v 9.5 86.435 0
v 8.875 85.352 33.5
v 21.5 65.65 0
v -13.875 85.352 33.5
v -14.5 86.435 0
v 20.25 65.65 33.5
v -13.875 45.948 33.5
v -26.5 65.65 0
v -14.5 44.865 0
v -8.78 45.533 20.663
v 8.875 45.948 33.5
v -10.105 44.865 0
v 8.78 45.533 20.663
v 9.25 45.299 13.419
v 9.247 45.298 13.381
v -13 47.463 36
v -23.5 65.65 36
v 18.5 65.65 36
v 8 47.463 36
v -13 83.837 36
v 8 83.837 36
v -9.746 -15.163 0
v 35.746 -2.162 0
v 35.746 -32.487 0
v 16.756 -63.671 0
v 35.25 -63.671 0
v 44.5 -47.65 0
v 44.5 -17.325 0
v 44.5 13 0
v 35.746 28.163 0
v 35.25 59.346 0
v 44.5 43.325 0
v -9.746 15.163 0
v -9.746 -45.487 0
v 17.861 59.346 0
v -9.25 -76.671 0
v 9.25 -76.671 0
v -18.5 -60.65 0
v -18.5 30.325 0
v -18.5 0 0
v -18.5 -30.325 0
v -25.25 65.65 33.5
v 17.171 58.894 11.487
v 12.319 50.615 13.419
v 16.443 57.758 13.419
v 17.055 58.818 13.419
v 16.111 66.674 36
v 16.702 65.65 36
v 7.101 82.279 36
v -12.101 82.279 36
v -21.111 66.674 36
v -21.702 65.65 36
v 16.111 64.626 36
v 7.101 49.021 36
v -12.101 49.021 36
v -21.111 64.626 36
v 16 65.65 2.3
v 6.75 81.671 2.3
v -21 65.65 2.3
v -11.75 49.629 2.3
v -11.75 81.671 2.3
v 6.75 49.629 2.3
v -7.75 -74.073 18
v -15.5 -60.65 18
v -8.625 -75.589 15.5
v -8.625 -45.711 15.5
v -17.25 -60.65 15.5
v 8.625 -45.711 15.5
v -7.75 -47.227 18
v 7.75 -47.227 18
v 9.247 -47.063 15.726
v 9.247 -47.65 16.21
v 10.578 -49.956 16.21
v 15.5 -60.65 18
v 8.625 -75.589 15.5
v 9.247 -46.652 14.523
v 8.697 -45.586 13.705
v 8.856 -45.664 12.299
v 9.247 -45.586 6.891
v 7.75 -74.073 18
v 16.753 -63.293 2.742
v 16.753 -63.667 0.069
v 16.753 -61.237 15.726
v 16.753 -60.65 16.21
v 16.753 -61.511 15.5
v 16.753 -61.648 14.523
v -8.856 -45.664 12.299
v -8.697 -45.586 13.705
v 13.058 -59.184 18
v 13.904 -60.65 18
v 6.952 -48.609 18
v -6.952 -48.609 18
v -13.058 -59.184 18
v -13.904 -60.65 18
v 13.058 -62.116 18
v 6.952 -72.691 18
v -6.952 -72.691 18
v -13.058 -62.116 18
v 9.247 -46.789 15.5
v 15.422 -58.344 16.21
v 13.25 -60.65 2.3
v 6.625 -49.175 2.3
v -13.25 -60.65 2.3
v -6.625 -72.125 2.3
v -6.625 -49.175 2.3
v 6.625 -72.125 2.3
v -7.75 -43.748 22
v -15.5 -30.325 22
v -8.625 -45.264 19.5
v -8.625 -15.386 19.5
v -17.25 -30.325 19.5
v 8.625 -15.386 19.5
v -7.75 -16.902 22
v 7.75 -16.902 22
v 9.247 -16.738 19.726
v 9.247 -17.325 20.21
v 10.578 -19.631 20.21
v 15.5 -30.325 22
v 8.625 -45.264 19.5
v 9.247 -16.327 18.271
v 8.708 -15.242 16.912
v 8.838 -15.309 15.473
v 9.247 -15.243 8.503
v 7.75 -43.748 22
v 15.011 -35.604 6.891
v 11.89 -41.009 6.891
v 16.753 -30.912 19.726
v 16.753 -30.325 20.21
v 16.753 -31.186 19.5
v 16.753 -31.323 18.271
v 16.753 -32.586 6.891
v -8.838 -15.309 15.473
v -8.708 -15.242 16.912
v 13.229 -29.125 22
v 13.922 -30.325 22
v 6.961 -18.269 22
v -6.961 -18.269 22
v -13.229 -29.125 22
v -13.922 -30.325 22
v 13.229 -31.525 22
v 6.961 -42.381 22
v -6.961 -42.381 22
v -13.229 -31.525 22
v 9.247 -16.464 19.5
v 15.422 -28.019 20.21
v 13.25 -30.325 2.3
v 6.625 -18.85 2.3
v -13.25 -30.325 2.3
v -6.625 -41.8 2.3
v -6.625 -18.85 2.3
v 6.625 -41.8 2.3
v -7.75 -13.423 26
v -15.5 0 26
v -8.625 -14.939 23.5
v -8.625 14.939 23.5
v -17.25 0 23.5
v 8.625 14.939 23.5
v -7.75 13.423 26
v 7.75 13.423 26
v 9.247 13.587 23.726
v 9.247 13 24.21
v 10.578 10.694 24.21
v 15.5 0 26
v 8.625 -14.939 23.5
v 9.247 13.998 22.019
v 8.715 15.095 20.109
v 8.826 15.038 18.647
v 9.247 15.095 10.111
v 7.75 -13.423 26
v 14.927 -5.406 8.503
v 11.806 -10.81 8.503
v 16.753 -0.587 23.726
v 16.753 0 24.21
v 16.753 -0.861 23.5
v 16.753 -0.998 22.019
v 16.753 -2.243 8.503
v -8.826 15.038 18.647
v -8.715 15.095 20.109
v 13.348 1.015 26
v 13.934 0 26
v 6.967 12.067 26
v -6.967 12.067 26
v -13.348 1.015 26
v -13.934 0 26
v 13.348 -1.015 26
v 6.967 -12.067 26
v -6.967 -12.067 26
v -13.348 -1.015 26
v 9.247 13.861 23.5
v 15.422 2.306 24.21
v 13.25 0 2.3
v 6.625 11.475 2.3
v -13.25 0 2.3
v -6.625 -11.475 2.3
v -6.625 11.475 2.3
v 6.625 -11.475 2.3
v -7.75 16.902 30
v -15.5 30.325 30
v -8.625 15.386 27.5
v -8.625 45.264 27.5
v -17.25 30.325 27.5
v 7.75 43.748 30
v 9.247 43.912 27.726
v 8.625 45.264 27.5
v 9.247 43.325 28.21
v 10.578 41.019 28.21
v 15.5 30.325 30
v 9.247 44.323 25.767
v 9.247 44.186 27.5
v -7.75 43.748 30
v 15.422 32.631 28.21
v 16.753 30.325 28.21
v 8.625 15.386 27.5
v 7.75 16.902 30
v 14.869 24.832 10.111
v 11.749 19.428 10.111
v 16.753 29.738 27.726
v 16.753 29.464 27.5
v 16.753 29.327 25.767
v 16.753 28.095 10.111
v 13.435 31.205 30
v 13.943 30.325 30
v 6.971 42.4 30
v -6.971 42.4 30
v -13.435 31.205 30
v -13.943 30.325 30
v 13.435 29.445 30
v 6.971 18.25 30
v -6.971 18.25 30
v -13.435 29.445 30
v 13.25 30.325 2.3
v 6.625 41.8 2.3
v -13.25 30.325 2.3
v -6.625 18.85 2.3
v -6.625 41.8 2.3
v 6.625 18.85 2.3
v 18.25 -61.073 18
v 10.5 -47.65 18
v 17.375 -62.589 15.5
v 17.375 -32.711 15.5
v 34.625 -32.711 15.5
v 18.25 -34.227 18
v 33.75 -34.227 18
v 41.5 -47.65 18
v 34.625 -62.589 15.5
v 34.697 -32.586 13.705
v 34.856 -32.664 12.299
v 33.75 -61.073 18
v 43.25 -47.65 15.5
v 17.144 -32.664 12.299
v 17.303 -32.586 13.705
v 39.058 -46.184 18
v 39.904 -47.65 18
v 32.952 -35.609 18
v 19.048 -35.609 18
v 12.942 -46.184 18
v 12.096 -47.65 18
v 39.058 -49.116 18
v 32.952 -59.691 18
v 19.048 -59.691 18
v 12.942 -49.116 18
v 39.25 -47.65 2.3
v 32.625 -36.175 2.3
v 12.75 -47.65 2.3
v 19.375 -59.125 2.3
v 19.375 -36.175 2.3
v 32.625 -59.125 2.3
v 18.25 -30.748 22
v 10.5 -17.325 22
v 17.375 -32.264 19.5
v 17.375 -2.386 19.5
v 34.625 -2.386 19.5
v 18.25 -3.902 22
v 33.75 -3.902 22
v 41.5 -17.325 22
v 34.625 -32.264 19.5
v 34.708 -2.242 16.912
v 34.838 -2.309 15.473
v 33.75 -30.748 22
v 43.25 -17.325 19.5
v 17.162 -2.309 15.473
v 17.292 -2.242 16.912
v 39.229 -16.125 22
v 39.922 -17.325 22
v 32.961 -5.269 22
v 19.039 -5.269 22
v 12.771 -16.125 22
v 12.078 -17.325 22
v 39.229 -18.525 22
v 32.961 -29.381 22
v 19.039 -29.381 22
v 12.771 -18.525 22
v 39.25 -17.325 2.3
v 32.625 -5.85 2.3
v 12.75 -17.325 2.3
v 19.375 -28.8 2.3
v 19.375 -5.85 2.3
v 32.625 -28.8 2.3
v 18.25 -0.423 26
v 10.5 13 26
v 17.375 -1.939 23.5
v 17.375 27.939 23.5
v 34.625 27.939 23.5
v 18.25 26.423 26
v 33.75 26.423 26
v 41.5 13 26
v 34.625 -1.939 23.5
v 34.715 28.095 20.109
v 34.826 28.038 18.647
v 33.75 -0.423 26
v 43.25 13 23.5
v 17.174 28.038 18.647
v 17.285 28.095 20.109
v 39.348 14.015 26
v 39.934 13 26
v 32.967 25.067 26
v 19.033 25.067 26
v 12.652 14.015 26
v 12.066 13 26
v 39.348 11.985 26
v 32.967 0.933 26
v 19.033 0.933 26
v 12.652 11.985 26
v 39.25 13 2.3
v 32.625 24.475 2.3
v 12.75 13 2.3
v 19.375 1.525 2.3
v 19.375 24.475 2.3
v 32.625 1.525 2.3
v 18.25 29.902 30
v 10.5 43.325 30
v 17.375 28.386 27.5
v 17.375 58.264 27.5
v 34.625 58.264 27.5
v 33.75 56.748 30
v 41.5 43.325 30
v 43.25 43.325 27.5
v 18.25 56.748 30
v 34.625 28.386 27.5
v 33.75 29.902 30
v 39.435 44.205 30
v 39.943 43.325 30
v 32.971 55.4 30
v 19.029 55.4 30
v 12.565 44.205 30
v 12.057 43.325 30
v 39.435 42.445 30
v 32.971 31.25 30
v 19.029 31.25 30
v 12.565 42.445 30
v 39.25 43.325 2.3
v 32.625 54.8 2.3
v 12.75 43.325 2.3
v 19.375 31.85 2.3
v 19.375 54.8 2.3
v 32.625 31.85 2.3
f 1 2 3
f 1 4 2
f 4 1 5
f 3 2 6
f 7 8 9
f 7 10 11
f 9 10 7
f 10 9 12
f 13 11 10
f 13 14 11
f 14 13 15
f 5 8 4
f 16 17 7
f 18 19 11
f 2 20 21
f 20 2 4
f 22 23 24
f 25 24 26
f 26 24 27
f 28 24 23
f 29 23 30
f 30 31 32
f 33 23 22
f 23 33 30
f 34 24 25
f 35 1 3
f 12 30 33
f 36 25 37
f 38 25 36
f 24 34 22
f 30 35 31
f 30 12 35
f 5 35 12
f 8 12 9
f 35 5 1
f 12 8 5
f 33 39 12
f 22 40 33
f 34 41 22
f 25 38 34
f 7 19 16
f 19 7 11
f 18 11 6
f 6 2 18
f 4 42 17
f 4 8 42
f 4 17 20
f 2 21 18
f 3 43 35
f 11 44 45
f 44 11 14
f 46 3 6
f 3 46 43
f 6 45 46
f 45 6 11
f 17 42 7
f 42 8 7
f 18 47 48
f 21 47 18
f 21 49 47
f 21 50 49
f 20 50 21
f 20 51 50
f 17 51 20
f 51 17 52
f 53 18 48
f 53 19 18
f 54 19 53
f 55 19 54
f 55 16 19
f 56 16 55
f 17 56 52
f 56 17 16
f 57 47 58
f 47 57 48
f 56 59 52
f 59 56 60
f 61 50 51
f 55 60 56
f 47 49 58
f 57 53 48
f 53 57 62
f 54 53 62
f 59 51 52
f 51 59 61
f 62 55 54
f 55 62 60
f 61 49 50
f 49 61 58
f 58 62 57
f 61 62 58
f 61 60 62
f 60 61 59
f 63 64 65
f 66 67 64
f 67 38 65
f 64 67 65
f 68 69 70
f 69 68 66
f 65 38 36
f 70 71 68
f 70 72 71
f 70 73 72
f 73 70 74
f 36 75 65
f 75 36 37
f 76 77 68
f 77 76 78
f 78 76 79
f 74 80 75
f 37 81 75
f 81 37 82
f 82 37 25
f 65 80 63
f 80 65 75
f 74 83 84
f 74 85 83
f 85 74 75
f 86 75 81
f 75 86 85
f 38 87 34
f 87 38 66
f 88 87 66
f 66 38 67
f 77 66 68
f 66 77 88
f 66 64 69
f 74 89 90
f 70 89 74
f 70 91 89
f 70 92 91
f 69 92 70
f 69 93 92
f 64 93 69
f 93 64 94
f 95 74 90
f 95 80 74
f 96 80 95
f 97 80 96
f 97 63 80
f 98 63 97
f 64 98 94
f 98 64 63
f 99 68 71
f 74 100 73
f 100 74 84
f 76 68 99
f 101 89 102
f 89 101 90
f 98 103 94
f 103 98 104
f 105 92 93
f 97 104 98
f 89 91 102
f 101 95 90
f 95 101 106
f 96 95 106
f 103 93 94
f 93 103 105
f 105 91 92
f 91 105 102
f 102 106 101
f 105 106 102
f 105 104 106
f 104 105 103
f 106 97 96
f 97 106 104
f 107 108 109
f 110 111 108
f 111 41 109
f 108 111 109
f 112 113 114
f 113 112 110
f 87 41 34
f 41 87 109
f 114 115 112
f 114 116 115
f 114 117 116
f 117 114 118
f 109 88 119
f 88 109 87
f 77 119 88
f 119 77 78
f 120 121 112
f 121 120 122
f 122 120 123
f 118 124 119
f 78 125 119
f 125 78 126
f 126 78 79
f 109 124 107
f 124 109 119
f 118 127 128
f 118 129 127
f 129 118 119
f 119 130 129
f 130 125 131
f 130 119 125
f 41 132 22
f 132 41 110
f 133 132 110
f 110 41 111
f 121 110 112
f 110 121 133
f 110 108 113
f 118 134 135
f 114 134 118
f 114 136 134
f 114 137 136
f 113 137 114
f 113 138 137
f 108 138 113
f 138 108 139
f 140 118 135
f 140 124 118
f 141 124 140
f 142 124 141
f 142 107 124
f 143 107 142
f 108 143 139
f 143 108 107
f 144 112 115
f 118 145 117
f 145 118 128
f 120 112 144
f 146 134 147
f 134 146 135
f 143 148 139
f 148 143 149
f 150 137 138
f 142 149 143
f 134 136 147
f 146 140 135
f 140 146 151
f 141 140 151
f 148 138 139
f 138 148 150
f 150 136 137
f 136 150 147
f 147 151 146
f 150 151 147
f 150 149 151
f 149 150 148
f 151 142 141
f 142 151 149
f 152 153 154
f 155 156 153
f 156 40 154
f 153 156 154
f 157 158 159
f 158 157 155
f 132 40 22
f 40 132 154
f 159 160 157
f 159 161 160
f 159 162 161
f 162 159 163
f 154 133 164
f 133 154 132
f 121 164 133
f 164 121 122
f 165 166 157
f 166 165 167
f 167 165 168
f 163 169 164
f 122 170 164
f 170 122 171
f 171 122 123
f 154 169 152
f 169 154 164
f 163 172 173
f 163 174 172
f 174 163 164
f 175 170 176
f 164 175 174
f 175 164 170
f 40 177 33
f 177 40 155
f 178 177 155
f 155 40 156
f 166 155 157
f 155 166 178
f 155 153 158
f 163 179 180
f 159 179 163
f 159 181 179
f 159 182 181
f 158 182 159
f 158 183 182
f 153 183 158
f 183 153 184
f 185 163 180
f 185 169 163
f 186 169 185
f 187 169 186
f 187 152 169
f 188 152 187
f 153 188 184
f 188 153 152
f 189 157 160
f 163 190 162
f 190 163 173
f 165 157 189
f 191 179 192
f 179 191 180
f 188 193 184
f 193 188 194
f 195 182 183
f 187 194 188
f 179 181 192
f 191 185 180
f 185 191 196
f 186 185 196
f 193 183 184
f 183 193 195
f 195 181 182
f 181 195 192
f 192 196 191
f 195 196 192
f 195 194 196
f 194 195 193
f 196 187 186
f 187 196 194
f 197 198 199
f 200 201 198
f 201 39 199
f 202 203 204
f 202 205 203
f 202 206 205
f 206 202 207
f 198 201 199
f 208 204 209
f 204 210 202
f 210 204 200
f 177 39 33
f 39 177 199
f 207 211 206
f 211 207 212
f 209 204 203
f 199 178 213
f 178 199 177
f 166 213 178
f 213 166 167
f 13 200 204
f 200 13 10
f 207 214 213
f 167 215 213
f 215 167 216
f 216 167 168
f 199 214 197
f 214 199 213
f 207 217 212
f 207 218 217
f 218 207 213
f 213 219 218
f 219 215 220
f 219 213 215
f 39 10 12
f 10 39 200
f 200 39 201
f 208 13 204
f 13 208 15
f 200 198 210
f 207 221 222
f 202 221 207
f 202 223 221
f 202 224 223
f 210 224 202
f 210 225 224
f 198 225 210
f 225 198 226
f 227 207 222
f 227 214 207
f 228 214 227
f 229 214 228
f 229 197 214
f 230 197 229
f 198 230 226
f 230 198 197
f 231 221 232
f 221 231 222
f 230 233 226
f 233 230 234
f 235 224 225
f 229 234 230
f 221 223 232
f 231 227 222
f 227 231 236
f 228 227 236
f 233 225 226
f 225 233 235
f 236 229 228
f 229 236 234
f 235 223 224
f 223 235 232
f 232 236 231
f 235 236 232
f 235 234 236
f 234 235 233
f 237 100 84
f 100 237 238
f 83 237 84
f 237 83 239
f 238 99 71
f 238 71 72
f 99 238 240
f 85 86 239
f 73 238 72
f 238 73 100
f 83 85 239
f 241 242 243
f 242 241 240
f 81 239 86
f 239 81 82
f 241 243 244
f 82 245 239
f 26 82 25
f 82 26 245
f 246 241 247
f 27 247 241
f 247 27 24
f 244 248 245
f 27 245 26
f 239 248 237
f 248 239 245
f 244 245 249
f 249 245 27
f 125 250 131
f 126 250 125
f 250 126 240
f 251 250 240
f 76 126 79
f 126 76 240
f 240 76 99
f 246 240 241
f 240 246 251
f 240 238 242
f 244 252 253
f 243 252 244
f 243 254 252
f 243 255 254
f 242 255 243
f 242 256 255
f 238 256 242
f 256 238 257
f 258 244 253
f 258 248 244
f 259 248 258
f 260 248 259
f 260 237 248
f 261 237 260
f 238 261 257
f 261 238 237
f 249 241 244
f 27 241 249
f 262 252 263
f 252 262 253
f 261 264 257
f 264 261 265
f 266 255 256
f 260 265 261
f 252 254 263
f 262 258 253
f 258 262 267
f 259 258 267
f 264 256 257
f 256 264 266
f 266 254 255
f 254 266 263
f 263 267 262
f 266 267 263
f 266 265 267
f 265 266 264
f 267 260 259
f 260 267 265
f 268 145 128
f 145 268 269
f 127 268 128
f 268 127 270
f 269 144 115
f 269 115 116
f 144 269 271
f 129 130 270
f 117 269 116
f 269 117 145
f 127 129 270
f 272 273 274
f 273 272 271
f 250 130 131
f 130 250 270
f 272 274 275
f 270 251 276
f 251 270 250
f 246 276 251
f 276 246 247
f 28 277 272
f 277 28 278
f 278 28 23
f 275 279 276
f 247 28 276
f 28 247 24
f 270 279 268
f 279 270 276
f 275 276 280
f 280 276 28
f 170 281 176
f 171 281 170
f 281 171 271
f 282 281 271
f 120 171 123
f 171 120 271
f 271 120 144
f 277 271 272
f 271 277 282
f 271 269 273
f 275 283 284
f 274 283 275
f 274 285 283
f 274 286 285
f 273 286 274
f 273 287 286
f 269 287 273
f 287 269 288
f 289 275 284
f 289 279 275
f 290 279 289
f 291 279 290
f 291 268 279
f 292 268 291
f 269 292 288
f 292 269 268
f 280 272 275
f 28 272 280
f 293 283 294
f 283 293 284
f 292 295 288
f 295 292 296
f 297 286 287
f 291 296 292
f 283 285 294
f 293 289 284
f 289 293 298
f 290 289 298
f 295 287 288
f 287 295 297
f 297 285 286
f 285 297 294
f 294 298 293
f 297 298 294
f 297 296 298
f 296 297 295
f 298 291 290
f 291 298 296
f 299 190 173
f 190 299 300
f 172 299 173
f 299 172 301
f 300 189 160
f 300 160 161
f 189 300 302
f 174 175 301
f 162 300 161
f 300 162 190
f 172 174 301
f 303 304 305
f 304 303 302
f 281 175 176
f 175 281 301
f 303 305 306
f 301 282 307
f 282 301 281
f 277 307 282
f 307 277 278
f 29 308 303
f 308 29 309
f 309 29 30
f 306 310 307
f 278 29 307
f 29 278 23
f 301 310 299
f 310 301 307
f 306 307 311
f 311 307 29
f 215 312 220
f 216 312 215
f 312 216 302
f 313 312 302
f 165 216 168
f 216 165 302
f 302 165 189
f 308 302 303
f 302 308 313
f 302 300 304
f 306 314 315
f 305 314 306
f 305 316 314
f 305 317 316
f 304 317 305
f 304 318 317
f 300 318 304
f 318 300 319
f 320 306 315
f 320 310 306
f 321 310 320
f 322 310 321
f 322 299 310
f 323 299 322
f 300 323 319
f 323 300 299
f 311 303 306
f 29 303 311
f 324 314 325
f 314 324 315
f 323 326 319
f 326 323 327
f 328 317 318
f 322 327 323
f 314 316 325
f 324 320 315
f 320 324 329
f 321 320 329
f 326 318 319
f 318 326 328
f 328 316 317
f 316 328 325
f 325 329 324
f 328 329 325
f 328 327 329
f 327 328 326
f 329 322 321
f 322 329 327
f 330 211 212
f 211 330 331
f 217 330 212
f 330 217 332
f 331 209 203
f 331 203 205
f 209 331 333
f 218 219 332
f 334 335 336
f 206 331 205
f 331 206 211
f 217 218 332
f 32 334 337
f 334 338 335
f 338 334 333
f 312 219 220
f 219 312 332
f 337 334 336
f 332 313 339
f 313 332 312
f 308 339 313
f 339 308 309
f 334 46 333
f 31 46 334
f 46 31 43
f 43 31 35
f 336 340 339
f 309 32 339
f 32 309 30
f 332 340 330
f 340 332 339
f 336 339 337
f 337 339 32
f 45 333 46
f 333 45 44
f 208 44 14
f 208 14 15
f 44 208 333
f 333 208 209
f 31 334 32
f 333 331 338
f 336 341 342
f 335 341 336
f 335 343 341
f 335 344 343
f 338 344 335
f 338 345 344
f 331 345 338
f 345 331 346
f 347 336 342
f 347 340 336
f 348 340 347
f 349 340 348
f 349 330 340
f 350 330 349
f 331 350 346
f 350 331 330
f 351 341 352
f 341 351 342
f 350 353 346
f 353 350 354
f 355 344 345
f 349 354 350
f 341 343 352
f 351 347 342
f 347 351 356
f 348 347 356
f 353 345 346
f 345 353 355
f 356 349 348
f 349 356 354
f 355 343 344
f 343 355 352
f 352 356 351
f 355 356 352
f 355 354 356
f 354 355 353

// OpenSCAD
//Wheeler's HEX holder builder
inner = 13.25;
outer = 15.5;
height = 26;
bottom = 2.3;

outer_bulge = 1.75;
outer_flare = 3;
outer_bevel = 2.5;
inner_flare = .75;

//autogen variables
shift_side = inner*2 + (outer-inner)*1.7;
shift_point = inner*2 -.5;

module hex(id, od, sides, height){
    difference(){
        hull(){
            cylinder(height, od, od, $fn=sides);
            cylinder(height-outer_bevel, od+outer_flare, od+outer_bulge, $fn=sides);
        }    
        translate([0,0,bottom])
        cylinder(height, id, id+inner_flare, $fn=sides);
    }
}

//large hex (juice!)
translate([-2.5, shift_side*2 +5,0])
hex(18.5, 21, 6, height+10);

//loop other hexes
for(j=[0:1:1]){
    for(i=[-2:1:1]){
        translate([j * shift_point, shift_side * i + j * .5 * shift_point,0])
        hex(inner, outer, 6, height + i * 4);
    }
}
